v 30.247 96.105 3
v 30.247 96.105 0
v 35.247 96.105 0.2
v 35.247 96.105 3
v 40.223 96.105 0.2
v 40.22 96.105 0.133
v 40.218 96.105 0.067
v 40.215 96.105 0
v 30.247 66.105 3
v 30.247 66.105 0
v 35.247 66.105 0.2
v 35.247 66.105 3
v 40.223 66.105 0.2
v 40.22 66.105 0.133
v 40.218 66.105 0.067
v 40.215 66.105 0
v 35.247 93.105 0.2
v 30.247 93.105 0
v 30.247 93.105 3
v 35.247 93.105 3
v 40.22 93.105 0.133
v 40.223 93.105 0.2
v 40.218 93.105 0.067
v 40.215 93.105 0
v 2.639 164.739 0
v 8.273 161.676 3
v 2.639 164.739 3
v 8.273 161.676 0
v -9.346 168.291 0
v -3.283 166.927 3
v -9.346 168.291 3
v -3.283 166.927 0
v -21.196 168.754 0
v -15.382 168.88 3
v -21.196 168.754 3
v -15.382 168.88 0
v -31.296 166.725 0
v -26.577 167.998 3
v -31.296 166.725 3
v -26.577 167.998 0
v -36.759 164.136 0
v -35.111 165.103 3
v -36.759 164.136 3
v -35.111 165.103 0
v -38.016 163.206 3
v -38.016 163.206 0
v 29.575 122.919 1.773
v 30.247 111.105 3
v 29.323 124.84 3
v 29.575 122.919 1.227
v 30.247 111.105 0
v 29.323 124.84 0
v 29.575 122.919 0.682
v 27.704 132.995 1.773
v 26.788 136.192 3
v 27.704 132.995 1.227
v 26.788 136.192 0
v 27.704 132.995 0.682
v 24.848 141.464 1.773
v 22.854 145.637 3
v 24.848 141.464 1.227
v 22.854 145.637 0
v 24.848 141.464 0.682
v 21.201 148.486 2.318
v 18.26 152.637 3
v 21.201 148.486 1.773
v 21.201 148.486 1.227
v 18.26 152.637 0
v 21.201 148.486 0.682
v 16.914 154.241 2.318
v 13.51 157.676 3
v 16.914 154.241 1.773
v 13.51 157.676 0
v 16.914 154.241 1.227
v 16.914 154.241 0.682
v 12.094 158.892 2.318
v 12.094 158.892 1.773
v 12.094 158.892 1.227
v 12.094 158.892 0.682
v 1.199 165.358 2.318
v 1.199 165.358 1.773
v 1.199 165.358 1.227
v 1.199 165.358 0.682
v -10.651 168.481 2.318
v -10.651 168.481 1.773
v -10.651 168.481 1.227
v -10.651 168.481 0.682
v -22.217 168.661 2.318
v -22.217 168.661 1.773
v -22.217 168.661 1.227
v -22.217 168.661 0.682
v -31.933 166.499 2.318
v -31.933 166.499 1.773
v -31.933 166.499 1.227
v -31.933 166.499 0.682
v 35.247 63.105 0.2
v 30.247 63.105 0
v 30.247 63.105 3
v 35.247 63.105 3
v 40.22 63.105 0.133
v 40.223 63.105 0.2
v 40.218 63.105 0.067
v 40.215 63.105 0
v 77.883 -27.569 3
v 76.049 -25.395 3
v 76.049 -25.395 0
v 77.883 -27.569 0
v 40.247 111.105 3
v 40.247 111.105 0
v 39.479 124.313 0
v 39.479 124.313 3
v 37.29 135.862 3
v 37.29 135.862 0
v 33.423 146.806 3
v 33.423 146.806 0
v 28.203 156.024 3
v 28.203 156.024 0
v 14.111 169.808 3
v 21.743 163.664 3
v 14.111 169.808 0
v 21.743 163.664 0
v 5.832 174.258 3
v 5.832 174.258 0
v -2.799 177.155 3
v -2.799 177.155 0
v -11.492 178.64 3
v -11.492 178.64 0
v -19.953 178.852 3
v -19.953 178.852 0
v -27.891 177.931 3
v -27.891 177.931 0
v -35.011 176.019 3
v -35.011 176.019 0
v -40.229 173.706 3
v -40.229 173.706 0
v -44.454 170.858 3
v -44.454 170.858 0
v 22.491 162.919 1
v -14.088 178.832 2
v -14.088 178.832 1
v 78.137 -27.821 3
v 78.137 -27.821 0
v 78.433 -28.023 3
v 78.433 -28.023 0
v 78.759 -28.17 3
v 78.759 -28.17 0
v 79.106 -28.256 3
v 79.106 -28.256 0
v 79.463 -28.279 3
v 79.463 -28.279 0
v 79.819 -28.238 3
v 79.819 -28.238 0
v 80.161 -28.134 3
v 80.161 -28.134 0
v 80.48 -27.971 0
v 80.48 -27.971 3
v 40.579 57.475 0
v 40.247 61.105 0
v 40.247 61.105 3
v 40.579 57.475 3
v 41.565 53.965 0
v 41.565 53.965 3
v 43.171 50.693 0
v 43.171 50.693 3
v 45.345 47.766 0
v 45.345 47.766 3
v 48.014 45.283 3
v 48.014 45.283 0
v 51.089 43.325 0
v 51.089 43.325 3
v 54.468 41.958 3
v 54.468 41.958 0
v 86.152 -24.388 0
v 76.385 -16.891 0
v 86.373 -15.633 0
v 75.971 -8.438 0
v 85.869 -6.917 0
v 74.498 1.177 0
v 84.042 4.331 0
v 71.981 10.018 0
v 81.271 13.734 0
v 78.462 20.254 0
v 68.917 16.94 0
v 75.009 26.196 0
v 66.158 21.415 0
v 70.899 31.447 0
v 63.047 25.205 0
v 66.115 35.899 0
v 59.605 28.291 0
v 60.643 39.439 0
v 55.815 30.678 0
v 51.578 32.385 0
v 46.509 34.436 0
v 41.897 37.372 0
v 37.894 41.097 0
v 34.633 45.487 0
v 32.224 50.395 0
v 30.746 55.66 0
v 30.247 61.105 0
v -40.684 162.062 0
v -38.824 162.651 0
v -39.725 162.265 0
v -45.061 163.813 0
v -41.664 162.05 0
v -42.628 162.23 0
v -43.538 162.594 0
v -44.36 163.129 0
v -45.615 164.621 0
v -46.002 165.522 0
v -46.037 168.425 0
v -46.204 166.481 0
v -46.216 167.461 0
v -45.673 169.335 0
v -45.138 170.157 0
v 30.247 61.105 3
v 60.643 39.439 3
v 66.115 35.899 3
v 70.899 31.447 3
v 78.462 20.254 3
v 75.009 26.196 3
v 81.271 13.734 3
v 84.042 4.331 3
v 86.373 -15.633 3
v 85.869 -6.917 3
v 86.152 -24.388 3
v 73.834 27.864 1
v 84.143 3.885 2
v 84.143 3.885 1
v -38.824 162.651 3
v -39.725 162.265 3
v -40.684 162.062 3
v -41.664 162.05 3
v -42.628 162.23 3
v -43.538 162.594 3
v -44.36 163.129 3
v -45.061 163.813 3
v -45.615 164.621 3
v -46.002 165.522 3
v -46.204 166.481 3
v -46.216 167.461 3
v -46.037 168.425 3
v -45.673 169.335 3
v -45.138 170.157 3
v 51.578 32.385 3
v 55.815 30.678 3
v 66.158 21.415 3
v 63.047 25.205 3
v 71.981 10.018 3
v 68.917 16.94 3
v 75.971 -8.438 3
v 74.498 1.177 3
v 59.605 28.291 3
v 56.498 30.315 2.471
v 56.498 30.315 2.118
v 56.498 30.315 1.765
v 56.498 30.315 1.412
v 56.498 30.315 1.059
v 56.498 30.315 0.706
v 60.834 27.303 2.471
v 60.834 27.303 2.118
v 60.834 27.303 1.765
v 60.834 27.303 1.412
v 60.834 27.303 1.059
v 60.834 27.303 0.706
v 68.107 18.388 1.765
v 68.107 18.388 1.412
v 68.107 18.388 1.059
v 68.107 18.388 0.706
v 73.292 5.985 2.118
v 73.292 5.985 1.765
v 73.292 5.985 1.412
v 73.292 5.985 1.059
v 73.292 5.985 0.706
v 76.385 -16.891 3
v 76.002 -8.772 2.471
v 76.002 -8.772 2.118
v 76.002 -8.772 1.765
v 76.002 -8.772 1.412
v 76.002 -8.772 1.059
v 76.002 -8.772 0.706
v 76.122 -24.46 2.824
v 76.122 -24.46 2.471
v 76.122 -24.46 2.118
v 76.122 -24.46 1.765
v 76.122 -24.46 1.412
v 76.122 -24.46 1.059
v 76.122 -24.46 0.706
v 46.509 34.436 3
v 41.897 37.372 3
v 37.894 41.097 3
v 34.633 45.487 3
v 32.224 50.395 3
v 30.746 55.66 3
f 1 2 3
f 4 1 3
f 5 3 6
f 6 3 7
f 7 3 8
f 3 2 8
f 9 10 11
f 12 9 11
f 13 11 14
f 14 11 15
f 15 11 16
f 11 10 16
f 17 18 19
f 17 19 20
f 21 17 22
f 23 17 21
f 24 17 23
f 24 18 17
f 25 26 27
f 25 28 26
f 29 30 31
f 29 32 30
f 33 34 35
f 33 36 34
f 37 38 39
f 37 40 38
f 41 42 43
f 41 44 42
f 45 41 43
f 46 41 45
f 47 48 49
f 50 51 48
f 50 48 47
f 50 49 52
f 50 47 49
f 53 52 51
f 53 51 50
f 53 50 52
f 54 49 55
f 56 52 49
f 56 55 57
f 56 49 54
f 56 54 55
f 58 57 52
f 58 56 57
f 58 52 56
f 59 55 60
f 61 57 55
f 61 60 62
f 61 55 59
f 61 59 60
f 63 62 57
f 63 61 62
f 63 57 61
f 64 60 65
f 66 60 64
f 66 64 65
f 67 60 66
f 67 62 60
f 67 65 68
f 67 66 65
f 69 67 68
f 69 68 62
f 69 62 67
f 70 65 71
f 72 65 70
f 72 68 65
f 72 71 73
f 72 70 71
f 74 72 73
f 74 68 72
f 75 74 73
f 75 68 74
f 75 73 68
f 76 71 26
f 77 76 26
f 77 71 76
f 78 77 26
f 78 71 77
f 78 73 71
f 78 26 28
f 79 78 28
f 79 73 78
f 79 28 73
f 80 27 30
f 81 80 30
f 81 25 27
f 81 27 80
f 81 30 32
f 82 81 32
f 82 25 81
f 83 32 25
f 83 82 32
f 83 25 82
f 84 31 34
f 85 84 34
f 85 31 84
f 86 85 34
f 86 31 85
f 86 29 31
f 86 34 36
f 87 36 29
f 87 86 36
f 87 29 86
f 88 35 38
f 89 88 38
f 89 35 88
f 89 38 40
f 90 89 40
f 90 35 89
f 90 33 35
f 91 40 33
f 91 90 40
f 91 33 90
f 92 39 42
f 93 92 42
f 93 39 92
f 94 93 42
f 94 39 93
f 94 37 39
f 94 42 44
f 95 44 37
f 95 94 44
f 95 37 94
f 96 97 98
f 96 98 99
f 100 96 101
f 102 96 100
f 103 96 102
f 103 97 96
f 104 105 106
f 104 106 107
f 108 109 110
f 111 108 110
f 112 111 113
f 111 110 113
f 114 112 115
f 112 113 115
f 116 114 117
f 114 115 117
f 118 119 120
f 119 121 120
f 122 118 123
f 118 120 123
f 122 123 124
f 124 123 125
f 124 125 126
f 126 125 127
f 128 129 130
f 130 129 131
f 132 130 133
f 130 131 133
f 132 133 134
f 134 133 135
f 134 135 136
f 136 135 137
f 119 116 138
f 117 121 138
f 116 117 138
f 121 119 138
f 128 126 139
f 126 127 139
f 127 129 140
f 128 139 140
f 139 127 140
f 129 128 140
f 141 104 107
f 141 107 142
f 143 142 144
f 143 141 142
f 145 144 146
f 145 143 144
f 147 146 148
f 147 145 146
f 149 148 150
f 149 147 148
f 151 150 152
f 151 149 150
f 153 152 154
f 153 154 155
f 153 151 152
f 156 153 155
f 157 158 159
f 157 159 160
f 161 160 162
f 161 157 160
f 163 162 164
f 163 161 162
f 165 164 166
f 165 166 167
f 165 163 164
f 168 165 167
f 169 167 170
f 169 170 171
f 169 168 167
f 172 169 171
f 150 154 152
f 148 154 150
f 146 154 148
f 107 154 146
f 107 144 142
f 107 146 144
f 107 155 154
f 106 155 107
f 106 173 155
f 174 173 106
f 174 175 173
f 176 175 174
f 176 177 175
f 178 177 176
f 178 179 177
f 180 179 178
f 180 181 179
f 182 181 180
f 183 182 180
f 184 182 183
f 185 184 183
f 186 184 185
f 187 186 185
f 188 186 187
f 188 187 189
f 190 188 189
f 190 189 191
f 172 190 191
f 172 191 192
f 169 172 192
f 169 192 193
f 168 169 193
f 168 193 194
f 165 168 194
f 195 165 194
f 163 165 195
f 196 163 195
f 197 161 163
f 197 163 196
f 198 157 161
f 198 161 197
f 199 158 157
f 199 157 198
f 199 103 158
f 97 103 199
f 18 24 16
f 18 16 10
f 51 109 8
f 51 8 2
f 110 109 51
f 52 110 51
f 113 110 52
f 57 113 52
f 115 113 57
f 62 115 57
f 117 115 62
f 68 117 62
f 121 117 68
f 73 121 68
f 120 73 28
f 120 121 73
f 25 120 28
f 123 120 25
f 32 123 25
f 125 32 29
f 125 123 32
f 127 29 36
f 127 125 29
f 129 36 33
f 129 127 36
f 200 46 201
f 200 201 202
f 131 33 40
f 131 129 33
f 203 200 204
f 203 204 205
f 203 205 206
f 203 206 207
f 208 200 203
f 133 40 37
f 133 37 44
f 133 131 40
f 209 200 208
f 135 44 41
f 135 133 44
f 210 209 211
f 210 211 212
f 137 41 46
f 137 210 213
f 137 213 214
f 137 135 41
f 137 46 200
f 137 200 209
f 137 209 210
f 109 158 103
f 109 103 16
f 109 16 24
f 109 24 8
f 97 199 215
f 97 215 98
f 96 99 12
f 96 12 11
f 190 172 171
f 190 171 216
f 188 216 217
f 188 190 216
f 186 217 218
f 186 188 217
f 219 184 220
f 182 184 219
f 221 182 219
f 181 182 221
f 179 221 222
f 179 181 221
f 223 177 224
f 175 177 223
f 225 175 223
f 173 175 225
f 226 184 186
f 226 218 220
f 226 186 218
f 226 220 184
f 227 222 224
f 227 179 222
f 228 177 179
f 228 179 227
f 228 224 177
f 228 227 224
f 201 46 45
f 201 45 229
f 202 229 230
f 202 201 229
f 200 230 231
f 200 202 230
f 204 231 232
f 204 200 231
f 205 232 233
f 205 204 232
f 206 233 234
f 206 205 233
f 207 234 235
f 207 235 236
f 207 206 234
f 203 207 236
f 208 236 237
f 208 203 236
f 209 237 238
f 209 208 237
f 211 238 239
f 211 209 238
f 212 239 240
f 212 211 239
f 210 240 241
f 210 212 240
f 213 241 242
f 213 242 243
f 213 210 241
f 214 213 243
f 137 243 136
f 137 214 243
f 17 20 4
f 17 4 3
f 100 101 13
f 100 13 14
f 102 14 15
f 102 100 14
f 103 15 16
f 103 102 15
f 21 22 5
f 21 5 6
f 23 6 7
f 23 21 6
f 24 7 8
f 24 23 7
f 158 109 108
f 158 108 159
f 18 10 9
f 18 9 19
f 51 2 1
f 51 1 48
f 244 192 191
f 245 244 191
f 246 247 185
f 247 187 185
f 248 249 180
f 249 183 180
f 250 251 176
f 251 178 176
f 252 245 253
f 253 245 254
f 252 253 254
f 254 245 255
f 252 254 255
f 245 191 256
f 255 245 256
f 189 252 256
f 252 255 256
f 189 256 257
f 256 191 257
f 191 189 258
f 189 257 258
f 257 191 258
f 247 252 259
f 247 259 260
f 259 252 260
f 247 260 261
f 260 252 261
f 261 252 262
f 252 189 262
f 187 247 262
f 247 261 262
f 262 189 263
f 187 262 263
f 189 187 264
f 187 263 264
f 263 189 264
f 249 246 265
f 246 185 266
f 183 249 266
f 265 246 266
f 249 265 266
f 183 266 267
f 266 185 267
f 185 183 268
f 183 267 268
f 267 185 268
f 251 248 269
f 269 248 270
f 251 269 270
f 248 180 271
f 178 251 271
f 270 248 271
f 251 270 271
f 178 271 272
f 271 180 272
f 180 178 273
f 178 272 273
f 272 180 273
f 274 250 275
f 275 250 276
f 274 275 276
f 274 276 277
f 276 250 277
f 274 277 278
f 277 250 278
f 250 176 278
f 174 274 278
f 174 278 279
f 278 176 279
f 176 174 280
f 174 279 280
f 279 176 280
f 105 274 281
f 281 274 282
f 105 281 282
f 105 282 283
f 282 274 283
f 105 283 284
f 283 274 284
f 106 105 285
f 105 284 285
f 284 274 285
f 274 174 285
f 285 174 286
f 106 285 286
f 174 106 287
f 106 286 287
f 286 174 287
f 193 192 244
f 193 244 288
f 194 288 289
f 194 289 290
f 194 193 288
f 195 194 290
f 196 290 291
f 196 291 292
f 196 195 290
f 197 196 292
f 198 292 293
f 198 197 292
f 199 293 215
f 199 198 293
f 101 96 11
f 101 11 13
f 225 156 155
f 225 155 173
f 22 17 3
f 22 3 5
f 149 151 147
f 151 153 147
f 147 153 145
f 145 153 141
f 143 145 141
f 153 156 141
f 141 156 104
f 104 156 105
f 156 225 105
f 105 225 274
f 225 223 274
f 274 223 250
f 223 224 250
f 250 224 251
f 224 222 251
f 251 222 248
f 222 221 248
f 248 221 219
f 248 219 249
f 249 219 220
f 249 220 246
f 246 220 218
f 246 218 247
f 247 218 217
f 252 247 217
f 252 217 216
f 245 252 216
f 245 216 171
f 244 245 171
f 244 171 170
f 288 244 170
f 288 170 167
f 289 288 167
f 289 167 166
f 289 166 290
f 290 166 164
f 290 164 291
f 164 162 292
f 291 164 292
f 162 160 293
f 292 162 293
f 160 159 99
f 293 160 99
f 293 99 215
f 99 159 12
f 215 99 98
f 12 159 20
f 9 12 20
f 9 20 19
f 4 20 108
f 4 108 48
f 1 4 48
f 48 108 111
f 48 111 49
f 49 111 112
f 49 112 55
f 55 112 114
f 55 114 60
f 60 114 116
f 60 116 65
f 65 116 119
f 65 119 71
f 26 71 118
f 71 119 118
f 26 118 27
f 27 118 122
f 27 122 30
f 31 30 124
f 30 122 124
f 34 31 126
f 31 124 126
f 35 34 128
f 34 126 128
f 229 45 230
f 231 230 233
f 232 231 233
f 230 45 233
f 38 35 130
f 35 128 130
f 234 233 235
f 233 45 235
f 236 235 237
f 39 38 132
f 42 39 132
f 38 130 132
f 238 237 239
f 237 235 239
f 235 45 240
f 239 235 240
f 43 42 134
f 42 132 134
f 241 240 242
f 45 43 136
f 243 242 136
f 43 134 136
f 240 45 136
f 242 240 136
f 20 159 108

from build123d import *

# Parameters (mm, degrees)
BOSS_EXTRU_2_DEPTH      = 3
ENL_V_MAT_EXTRU_1_DEPTH = 141.768934672
EMPREINTE1_START        = 63.105178129
EMPREINTE1_DEPTH        = 3
EMPREINTE1_START_2      = 93.105178129
EMPREINTE1_2_DEPTH      = 3
BOSS_EXTRU_3_DEPTH      = 3


# Read off the part's stored shape, not the designer's step: Empreinte1
with BuildPart() as part:
    # Esquisse1 → Boss.-Extru.2 (new body)
    with BuildSketch(Plane.XY):
        with BuildLine():
            Line((40.247233076, 111.105178129), (40.247233076, 61.105178129))
            ThreePointArc((40.247233076, 61.105178129), (44.191308202, 49.180108885), (54.467960723, 41.95837654))
            add(Edge.make_bspline(
                [(54.467960723, 41.95837654), (93.469157599, 30.186251687), (94.060386504, -42.130931626), (70.625681641, -69.023414216)],
                knots=[0.073601613, 0.073601613, 0.073601613, 0.073601613, 1, 1, 1, 1], degree=3))
            Line((70.625681641, -69.023414216), (63.086562616, -62.453658944))
            add(Edge.make_bspline(
                [(51.578324546, 32.384975746), (52.441823747, 32.124337068), (54.160244695, 31.504173294), (57.306848095, 29.97035453), (60.909260152, 27.464002891), (64.778911343, 23.487842732), (69.333722485, 16.888912111), (73.713189985, 6.383804922), (76.439302823, -8.617528818), (76.523407917, -21.892716717), (75.336804817, -32.248132674), (73.851279993, -39.698340102), (71.811754469, -46.646923176), (69.699842941, -51.863805262), (67.806756273, -55.601272185), (66.298875889, -58.166006571), (64.985680603, -60.08494816), (63.904092742, -61.488799964), (63.366023798, -62.13296342), (63.086562616, -62.453658944)],
                knots=[0.073601613, 0.073601613, 0.073601613, 0.073601613, 0.102551563, 0.131501512, 0.189401411, 0.247301311, 0.30520121, 0.421001008, 0.536800806, 0.652600605, 0.710500504, 0.768400403, 0.826300302, 0.884200202, 0.913150151, 0.942100101, 0.97105005, 0.985525025, 1, 1, 1, 1], degree=3))
            ThreePointArc((51.578324546, 32.384975746), (36.163345766, 43.217574263), (30.247233076, 61.105178129))
            Line((30.247233076, 61.105178129), (30.247233076, 111.105178129))
            Line((30.247233076, 111.105178129), (40.247233076, 111.105178129))
        make_face()
    extrude(amount=BOSS_EXTRU_2_DEPTH)

    # Esquisse2 → Enlèv. mat.-Extru.1 (cut, through all)
    with BuildSketch(Plane.XY.offset(3)):
        with BuildLine():
            Line((58.604840791, -65.718091867), (72.675095618, -21.396789164))
            Line((72.675095618, -21.396789164), (77.883188433, -27.569343611))
            ThreePointArc((77.883188433, -27.569343611), (79.106345528, -28.256142913), (80.479757382, -27.970579539))
            Line((80.479757382, -27.970579539), (87.91787168, -23.272823141))
            Line((87.91787168, -23.272823141), (76.157367596, -75.355055511))
            Line((76.157367596, -75.355055511), (58.604840791, -65.718091867))
        make_face()
    extrude(amount=-ENL_V_MAT_EXTRU_1_DEPTH, mode=Mode.SUBTRACT)

    # Empreinte1 outline → Empreinte1 (cut)
    with BuildSketch(Plane(origin=(0, 0, 0), x_dir=(1, 0, 0), z_dir=(0, 1, 0)).offset(EMPREINTE1_START)):
        with BuildLine():
            ThreePointArc((40.222725568, -0.2), (40.219098005, -0.099995306), (40.215220265, 0))
            Line((40.215220265, 0), (30.247233076, 0))
            Line((30.247233076, 0), (30.247233076, -3))
            Line((30.247233076, -3), (35.247233076, -3))
            Line((35.247233076, -3), (35.247233076, -0.2))
            Line((35.247233076, -0.2), (40.222725568, -0.2))
        make_face()
    extrude(amount=EMPREINTE1_DEPTH, mode=Mode.SUBTRACT)

    # Empreinte1 2 outline → Empreinte1 2 (cut)
    with BuildSketch(Plane(origin=(0, 0, 0), x_dir=(1, 0, 0), z_dir=(0, 1, 0)).offset(EMPREINTE1_START_2)):
        with BuildLine():
            ThreePointArc((40.222725568, -0.2), (40.219098005, -0.099995306), (40.215220265, 0))
            Line((40.215220265, 0), (30.247233076, 0))
            Line((30.247233076, 0), (30.247233076, -3))
            Line((30.247233076, -3), (35.247233076, -3))
            Line((35.247233076, -3), (35.247233076, -0.2))
            Line((35.247233076, -0.2), (40.222725568, -0.2))
        make_face()
    extrude(amount=EMPREINTE1_2_DEPTH, mode=Mode.SUBTRACT)

    # Esquisse3 → Boss.-Extru.3 (add)
    with BuildSketch(Plane(origin=(0, 0, 0), x_dir=(-1, 0, 0), z_dir=(0, 0, -1))):
        with BuildLine():
            Line((-40.247233076, 111.105178129), (-30.247233076, 111.105178129))
            add(Edge.make_bspline(
                [(-30.247233076, 111.105178129), (-30.247233076, 112.14596965), (-30.217698493, 114.25472522), (-30.045014328, 118.252405482), (-29.624674548, 122.993020115), (-28.820656407, 128.236554261), (-27.74447291, 133.062686625), (-26.422917169, 137.485210513), (-24.367231012, 142.870966444), (-21.306772788, 148.697507946), (-17.00171943, 154.423085647), (-12.168743747, 159.053182078), (-6.886412749, 162.716784457), (0.639998699, 166.423733084), (8.67921262, 168.46569452), (16.603362122, 169.022509829), (22.293283685, 168.760231201), (27.526974489, 167.899846277), (31.325094184, 166.77680064), (33.908111954, 165.718326704), (35.589474071, 164.872941274), (36.748498996, 164.160369864), (37.530944286, 163.599193527), (37.852299425, 163.343502605), (38.016109762, 163.205698113)],
                knots=[0, 0, 0, 0, 0.015625, 0.03125, 0.0625, 0.09375, 0.125, 0.15625, 0.1875, 0.25, 0.3125, 0.375, 0.4375, 0.5, 0.625, 0.6875, 0.75, 0.8125, 0.875, 0.90625, 0.9375, 0.96875, 0.984375, 1, 1, 1, 1], degree=3))
            ThreePointArc((38.016109762, 163.205698113), (45.061039216, 163.813126294), (44.453611035, 170.858055748))
            add(Edge.make_bspline(
                [(-40.247233076, 111.105178129), (-40.247233076, 184.874305638), (25.539277275, 186.769628817), (44.453611035, 170.858055748)],
                knots=[0, 0, 0, 0, 1, 1, 1, 1], degree=3))
        make_face()
    extrude(amount=-BOSS_EXTRU_3_DEPTH)


solid = part.part
